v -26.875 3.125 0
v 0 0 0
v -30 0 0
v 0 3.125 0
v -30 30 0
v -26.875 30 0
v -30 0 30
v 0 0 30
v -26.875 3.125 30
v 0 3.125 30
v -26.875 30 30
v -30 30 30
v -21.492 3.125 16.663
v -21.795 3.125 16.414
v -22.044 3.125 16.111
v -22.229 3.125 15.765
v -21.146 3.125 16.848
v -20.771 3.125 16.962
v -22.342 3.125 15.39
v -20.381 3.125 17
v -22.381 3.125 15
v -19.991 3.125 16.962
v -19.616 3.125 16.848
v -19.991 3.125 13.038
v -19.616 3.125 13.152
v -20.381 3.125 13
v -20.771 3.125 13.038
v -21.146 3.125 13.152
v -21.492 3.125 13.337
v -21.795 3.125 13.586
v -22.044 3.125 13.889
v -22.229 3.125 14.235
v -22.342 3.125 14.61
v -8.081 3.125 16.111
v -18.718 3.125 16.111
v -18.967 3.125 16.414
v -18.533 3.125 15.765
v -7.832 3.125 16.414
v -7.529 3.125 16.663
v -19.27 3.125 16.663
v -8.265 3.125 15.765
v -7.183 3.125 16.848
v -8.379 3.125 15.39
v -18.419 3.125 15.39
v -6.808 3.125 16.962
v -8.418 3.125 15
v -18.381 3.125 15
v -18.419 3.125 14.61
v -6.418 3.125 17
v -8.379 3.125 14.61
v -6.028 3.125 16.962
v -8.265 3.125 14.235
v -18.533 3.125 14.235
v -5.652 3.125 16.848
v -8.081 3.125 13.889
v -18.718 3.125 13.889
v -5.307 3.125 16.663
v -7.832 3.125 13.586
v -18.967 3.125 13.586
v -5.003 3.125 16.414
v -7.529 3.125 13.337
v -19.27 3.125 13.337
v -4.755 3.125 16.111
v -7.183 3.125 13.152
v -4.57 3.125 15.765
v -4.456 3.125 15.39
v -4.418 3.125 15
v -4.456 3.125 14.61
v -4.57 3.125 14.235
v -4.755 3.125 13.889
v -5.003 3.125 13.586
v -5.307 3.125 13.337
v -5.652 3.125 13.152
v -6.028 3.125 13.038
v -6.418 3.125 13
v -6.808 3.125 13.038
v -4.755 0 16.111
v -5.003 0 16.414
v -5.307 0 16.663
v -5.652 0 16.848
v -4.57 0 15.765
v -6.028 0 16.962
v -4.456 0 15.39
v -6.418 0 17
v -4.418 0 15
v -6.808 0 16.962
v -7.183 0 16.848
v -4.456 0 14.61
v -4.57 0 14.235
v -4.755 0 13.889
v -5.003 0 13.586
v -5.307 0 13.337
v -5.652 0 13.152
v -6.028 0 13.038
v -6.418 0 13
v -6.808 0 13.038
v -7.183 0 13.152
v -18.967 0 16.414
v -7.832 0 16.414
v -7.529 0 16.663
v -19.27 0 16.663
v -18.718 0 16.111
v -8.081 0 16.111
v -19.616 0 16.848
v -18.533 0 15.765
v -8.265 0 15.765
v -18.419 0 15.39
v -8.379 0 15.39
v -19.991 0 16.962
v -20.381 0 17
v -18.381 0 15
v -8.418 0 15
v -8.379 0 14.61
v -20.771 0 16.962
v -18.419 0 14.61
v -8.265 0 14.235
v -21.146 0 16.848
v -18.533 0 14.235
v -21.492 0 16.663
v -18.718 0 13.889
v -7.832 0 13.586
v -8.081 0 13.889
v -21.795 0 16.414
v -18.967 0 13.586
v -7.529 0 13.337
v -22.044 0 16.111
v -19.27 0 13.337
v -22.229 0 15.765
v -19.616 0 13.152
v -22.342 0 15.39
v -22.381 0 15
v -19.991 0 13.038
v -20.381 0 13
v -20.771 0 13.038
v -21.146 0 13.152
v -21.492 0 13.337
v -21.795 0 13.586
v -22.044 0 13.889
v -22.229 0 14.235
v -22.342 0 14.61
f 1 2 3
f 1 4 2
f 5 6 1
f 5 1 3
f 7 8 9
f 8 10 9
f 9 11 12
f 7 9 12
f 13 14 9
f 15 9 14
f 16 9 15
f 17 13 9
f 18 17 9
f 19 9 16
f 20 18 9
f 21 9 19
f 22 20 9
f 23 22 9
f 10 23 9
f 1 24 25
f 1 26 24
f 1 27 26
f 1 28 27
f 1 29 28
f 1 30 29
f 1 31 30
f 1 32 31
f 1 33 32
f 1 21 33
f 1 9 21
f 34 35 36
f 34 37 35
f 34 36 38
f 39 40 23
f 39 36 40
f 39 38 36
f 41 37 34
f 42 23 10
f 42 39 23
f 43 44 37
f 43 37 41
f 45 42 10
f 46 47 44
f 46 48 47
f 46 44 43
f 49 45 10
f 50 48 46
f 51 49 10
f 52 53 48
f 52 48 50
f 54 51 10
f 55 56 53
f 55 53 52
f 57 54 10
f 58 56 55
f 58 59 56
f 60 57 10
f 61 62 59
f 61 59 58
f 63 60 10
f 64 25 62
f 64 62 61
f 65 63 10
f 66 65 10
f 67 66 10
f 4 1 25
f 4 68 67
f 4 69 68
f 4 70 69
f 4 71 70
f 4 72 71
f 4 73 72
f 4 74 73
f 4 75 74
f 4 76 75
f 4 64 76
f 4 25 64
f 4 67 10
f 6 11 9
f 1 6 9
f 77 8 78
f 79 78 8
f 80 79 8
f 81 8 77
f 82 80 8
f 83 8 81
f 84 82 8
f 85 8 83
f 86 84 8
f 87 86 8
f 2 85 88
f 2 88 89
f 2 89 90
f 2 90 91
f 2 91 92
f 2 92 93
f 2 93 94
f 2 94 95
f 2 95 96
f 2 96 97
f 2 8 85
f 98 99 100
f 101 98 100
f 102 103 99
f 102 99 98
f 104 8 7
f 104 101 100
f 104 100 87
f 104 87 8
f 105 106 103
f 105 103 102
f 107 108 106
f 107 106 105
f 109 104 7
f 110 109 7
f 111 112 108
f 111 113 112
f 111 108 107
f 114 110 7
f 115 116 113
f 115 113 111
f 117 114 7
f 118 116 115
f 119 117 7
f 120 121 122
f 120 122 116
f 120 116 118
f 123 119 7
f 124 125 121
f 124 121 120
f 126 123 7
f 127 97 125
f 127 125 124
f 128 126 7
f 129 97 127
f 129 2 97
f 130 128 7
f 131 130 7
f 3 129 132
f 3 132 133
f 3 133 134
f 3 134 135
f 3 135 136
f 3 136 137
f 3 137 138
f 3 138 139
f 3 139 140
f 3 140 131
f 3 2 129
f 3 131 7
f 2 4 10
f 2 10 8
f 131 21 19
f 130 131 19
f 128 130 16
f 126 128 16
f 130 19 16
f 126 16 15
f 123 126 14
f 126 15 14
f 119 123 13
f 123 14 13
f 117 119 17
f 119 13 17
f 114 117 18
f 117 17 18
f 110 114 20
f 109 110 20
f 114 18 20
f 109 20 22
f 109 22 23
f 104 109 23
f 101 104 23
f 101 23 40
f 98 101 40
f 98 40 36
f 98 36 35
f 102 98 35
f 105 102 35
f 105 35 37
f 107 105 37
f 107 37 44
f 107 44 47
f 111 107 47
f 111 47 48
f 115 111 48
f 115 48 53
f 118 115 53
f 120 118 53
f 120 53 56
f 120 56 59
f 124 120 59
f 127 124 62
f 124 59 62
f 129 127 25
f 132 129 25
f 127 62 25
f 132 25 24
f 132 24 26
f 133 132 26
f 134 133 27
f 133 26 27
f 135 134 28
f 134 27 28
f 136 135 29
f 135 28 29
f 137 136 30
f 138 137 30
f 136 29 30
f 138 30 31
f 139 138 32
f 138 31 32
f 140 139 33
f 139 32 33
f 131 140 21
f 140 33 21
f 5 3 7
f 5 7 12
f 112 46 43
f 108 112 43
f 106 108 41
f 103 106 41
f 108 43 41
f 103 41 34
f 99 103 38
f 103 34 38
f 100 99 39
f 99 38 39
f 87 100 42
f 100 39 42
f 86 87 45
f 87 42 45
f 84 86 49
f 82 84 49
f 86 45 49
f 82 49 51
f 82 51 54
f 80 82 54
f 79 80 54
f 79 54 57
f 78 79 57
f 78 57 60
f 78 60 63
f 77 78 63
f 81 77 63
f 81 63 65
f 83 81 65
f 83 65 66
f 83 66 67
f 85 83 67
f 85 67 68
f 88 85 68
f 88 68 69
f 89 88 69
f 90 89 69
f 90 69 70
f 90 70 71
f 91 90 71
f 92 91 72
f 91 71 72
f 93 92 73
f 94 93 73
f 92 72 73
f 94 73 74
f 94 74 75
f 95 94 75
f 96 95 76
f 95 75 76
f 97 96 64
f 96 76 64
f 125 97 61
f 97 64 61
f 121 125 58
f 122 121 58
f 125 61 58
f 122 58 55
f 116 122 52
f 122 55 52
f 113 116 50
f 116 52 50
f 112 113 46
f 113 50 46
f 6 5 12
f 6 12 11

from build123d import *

# Parameters (mm, degrees)
EXTRUS_O_FINA1_DEPTH  = 30
ESBO_O2_R             = 2
CORTE_EXTRUS_O1_DEPTH = 30


with BuildPart() as part:
    # Esboço1 → Extrusão-Fina1 (new body)
    with BuildSketch(Plane.XY):
        Polygon((0, 0), (-30, 0), (-30, 30), (-26.875, 30), (-26.875, 3.125), (0, 3.125), align=None)
    extrude(amount=EXTRUS_O_FINA1_DEPTH)

    # Esboço2 → Corte-extrusão1 (cut)
    with BuildSketch(Plane(origin=(0, 3.125, 0), x_dir=(1, 0, 0), z_dir=(0, 1, 0))):
        with Locations(Location((-6.417692874, -15, 0), (0, 0, 180))):  # turned: the seam where the file's is
            Circle(ESBO_O2_R)
        with Locations(Location((-20.380879672, -15, 0), (0, 0, 180))):  # turned: the seam where the file's is
            Circle(ESBO_O2_R)
    extrude(amount=-CORTE_EXTRUS_O1_DEPTH, mode=Mode.SUBTRACT)


solid = part.part
